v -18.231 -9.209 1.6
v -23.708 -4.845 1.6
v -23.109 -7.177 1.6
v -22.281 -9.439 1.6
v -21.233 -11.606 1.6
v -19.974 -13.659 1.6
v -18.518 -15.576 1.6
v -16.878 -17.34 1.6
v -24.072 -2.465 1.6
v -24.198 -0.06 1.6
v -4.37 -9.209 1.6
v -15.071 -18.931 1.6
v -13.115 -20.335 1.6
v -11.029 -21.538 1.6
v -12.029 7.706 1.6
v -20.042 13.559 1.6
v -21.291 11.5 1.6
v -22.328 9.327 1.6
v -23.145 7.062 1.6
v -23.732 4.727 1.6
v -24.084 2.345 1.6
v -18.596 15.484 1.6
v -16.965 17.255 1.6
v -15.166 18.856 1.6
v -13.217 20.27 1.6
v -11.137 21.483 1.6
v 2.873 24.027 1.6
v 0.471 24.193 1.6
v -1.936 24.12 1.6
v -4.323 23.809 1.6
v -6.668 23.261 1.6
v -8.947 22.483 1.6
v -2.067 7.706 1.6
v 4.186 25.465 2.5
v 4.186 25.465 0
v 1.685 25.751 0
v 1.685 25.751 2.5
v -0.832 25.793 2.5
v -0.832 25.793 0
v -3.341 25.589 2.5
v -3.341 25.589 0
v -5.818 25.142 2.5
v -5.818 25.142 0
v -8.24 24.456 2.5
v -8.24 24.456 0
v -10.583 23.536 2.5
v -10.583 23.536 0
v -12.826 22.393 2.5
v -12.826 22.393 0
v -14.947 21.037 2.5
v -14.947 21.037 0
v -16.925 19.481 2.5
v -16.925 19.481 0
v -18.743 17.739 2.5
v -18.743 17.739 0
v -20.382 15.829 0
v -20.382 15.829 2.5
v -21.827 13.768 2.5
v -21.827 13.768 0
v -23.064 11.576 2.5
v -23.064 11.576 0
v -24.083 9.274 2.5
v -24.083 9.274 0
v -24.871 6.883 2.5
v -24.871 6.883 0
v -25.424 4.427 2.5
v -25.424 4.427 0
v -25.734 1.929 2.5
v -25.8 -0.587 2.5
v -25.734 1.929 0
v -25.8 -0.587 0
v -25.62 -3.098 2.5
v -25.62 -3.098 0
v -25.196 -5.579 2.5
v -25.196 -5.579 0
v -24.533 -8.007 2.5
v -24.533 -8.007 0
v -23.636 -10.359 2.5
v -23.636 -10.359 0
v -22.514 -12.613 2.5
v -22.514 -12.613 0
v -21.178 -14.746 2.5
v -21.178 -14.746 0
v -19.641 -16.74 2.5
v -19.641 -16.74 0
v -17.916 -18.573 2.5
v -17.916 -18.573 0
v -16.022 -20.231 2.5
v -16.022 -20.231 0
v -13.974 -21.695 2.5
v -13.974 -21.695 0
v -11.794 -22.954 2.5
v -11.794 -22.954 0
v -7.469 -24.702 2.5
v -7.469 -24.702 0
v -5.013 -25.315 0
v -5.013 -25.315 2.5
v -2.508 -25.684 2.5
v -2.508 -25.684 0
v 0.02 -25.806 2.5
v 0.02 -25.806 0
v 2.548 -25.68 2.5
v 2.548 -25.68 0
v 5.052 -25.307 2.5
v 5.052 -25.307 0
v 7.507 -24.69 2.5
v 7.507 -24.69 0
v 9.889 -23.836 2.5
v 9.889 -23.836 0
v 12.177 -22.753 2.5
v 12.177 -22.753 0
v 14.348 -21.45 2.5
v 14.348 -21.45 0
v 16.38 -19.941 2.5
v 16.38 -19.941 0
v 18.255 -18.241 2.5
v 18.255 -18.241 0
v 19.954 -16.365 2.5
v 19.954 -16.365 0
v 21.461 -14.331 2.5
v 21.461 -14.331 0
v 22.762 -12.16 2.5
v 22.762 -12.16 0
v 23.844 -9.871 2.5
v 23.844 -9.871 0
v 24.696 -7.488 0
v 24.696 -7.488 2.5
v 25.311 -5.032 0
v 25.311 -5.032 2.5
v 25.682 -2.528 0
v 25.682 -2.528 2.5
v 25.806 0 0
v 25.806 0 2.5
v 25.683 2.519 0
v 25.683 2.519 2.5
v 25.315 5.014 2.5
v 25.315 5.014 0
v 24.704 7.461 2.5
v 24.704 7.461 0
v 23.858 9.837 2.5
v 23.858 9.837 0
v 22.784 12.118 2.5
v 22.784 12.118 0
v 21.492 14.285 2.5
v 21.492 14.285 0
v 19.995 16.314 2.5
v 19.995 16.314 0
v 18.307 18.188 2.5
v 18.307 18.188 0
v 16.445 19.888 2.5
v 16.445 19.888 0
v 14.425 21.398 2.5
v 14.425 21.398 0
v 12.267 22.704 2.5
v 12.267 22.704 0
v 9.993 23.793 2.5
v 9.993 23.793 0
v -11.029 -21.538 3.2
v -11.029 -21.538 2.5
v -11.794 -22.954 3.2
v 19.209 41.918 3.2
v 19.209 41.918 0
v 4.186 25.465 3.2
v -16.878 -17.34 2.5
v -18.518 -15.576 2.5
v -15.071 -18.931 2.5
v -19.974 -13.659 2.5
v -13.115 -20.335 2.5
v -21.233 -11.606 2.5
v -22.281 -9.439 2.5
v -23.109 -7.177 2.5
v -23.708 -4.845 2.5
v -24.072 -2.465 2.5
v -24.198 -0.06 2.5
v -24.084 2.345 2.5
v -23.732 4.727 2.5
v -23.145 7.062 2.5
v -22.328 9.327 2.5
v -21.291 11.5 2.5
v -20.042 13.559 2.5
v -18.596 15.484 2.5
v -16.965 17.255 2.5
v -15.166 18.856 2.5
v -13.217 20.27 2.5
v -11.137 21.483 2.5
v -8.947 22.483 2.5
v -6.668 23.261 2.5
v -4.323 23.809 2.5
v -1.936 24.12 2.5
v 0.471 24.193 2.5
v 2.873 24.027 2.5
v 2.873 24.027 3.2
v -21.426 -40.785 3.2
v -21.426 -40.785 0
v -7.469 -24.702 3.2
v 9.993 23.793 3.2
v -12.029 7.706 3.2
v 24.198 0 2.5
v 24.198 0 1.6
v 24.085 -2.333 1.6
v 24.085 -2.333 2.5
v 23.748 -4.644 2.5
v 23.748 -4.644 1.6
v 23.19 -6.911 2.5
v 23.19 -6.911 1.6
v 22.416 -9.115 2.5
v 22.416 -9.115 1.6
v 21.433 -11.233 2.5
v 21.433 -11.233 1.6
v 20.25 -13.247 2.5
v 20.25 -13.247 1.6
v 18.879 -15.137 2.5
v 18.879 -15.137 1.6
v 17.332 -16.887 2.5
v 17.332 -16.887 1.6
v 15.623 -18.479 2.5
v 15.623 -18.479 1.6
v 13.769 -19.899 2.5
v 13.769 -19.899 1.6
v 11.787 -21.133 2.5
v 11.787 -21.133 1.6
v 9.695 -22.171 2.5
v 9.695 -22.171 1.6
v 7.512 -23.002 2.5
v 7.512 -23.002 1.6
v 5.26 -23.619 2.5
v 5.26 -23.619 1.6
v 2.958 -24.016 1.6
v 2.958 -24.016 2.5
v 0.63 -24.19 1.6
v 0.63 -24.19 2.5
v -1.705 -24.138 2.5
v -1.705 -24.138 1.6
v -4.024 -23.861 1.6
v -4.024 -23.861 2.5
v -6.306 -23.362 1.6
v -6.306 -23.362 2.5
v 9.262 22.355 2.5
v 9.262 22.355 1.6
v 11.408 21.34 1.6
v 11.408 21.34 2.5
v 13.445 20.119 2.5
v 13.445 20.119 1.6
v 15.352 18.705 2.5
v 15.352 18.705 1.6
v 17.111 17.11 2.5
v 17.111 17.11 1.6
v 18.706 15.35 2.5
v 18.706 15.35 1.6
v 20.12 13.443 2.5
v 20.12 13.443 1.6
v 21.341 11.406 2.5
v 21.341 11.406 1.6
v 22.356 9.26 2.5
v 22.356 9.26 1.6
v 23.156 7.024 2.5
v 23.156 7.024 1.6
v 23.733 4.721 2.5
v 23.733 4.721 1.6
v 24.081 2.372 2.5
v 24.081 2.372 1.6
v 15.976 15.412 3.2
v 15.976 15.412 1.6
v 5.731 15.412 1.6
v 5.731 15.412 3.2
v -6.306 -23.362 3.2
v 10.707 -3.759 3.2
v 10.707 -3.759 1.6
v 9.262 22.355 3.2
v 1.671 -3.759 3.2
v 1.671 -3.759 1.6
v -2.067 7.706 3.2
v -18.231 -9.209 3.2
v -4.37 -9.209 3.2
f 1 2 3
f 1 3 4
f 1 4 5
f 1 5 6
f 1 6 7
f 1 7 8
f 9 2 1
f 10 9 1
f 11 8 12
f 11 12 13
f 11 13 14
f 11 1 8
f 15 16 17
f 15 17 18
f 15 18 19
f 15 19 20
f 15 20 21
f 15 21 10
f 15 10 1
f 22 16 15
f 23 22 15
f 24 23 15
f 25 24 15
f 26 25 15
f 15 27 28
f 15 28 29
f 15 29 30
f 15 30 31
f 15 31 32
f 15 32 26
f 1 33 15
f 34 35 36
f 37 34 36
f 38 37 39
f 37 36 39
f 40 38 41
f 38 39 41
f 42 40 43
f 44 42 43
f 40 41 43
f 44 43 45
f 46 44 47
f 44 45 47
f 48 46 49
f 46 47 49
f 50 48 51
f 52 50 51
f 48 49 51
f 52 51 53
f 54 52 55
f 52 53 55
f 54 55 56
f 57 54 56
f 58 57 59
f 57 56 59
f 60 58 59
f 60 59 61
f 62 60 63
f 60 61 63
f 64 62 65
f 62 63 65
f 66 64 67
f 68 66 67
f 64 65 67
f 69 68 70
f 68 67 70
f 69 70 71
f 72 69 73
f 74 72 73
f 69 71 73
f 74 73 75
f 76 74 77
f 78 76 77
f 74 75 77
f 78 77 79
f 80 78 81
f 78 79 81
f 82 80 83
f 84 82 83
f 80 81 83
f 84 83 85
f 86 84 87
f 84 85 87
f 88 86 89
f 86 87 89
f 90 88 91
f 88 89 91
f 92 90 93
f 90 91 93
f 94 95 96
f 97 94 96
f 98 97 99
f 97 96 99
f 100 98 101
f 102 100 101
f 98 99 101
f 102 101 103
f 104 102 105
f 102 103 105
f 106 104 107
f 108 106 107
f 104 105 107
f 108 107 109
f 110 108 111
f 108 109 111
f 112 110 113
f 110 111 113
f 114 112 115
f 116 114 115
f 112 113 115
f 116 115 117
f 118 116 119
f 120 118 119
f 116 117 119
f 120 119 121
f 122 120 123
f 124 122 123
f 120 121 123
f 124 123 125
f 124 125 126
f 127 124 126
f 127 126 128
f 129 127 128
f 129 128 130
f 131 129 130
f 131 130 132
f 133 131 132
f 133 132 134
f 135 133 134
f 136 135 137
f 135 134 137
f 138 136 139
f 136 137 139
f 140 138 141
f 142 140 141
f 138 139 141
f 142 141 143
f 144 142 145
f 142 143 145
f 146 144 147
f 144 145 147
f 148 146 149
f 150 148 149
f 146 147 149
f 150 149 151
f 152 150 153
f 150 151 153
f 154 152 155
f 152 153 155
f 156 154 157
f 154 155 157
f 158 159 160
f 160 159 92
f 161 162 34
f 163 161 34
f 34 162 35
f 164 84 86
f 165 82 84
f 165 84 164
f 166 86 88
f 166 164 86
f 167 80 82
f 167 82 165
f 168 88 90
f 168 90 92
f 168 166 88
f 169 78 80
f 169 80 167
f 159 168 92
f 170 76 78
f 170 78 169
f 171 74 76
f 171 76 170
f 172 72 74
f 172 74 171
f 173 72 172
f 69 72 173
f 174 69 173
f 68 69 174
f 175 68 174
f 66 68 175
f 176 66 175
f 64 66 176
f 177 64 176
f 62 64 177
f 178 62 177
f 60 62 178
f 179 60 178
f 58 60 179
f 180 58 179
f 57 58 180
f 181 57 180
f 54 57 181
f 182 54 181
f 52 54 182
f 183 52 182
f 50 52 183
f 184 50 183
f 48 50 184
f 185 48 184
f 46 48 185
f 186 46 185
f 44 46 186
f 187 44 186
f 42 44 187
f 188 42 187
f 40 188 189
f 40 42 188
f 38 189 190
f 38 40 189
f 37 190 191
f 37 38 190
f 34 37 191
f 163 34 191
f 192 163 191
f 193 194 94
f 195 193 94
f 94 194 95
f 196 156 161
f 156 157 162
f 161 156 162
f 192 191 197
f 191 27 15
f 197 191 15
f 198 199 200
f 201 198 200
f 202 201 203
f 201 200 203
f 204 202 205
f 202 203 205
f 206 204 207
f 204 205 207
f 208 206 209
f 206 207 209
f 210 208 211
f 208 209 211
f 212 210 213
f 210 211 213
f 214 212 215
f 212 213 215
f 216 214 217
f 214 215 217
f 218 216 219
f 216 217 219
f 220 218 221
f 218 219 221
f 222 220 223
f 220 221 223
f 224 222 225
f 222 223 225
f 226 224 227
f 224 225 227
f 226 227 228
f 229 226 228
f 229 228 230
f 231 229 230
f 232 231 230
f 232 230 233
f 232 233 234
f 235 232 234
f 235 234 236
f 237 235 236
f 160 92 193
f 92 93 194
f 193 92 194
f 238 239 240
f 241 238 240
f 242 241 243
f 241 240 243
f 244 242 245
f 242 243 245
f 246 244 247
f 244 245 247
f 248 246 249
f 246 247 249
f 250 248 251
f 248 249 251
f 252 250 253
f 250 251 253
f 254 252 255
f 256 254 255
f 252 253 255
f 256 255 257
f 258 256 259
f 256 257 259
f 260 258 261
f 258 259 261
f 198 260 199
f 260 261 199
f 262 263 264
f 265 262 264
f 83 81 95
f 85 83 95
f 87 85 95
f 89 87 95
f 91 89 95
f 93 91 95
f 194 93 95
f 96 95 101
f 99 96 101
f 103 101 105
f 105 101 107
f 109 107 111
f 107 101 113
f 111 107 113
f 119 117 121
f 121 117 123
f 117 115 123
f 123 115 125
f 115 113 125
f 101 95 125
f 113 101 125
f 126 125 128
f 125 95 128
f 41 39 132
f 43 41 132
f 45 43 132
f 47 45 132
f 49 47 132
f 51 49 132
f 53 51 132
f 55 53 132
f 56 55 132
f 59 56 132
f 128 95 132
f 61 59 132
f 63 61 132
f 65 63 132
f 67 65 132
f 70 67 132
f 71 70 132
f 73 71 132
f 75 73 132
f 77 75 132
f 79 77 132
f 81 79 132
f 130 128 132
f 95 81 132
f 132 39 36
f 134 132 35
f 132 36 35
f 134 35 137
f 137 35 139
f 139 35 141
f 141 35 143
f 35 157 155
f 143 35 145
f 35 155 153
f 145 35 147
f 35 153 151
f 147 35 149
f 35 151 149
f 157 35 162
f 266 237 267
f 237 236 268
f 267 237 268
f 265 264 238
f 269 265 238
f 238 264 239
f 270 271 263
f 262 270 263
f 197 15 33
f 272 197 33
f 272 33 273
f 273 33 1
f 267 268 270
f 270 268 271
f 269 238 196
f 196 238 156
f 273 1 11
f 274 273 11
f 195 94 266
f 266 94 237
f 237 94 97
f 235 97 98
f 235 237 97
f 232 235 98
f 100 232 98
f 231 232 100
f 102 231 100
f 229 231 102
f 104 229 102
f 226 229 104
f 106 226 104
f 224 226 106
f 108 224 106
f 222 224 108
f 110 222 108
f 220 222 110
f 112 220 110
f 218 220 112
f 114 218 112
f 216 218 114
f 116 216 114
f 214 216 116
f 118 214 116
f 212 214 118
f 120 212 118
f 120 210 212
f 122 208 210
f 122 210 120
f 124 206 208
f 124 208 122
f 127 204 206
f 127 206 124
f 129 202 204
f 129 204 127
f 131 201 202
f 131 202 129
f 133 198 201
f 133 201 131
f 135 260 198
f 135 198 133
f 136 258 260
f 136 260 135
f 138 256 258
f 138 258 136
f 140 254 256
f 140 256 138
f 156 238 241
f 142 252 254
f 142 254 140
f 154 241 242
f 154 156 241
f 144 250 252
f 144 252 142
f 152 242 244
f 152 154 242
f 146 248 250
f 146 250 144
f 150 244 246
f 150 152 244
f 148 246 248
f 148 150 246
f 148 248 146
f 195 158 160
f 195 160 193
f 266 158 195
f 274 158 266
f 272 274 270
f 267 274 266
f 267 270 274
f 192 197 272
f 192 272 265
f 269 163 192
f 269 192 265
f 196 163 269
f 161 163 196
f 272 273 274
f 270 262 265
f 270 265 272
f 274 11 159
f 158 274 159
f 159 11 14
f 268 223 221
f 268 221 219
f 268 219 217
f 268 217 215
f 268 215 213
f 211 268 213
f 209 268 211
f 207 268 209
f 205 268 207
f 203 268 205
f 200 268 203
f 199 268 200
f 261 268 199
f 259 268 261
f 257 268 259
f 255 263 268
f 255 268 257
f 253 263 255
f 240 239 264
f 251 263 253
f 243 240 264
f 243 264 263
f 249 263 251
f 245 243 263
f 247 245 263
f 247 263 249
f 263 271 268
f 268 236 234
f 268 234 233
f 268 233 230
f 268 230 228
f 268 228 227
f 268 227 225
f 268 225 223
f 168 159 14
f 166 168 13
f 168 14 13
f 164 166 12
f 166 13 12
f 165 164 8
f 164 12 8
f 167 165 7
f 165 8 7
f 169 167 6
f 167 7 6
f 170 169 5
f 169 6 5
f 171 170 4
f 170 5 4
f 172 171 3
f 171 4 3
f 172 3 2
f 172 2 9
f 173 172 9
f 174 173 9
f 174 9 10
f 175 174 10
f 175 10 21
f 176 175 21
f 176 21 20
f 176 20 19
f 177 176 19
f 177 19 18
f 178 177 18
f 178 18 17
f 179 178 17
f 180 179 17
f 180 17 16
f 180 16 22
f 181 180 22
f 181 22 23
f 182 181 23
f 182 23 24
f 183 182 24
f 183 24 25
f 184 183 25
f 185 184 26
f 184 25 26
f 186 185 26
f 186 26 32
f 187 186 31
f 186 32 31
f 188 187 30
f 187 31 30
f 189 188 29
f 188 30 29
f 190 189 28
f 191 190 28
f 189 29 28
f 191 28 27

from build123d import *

# Parameters (mm, degrees)
F1_DEPTH = 3.2
F2_DEPTH = 1.6
F3_DEPTH = 2.5


with BuildPart() as f1:
    # F0 (on Top) → F1 (new body)
    with BuildSketch(Plane.XY):
        with BuildLine():
            Line((5.7308066454, 15.4116954654), (9.2615315623, 22.3554545173))
            ThreePointArc((9.2615315623, 22.3554545173), (6.124599836, 23.4100745493), (2.8731075212, 24.026809333))
            Line((2.8731075212, 24.026809333), (-12.0286401361, 7.7058477327))
            Line((-12.0286401361, 7.7058477327), (-2.0674222615, 7.7058477327))
            Line((-2.0674222615, 7.7058477327), (-18.230907619, -9.2094279826))
            Line((-18.230907619, -9.2094279826), (-4.3697794008, -9.2094279826))
            Line((-4.3697794008, -9.2094279826), (-11.0294978873, -21.5381635686))
            ThreePointArc((-11.0294978873, -21.5381635686), (-8.7153894779, -22.573973948), (-6.3056047528, -23.3619704275))
            Line((-6.3056047528, -23.3619704275), (10.7070716166, -3.7589499261))
            Line((10.7070716166, -3.7589499261), (1.6710584512, -3.7589499261))
            Line((1.6710584512, -3.7589499261), (15.9755367786, 15.4116954654))
            Line((15.9755367786, 15.4116954654), (5.7308066454, 15.4116954654))
        make_face()
        with BuildLine():
            Line((-7.468564605, -24.7020021385), (-6.3056047528, -23.3619704275))
            ThreePointArc((-6.3056047528, -23.3619704275), (-8.7153894779, -22.573973948), (-11.0294978873, -21.5381635686))
            Line((-11.0294978873, -21.5381635686), (-11.7940875977, -22.9536024329))
            ThreePointArc((-11.7940875977, -22.9536024329), (-9.6709186664, -23.9257538869), (-7.468564605, -24.7020021385))
        make_face()
        with BuildLine():
            ThreePointArc((2.8731075212, 24.026809333), (6.124599836, 23.4100745493), (9.2615315623, 22.3554545173))
            Line((9.2615315623, 22.3554545173), (9.9925901152, 23.7932030147))
            ThreePointArc((9.9925901152, 23.7932030147), (7.1383273937, 24.799448561), (4.1858882241, 25.464616759))
            Line((4.1858882241, 25.464616759), (2.8731075212, 24.026809333))
        make_face()
        with BuildLine():
            ThreePointArc((4.1858882241, 25.464616759), (7.1383273937, 24.799448561), (9.9925901152, 23.7932030147))
            Line((9.9925901152, 23.7932030147), (19.2086462315, 41.9181135037))
            Line((19.2086462315, 41.9181135037), (4.1858882241, 25.464616759))
        make_face()
        with BuildLine():
            Line((-21.4260146022, -40.7846085727), (-7.468564605, -24.7020021385))
            ThreePointArc((-7.468564605, -24.7020021385), (-9.6709186664, -23.9257538869), (-11.7940875977, -22.9536024329))
            Line((-11.7940875977, -22.9536024329), (-21.4260146022, -40.7846085727))
        make_face()
    extrude(amount=F1_DEPTH)

    # F0 (on Top) → F2 (join)
    with BuildSketch(Plane.XY):
        with BuildLine():
            ThreePointArc((-6.3056047528, -23.3619704275), (14.7132492292, -19.2110023339), (24.1979816008, 0))
            ThreePointArc((24.1979816008, 0), (20.1202967659, 13.4430640706), (9.2615315623, 22.3554545173))
            Line((9.2615315623, 22.3554545173), (5.7308066454, 15.4116954654))
            Line((5.7308066454, 15.4116954654), (15.9755367786, 15.4116954654))
            Line((15.9755367786, 15.4116954654), (1.6710584512, -3.7589499261))
            Line((1.6710584512, -3.7589499261), (10.7070716166, -3.7589499261))
            Line((10.7070716166, -3.7589499261), (-6.3056047528, -23.3619704275))
        make_face()
        with BuildLine():
            Line((-12.0286401361, 7.7058477327), (2.8731075212, 24.026809333))
            ThreePointArc((2.8731075212, 24.026809333), (-23.1446184854, 7.061795007), (-11.0294978873, -21.5381635686))
            Line((-11.0294978873, -21.5381635686), (-4.3697794008, -9.2094279826))
            Line((-4.3697794008, -9.2094279826), (-18.230907619, -9.2094279826))
            Line((-18.230907619, -9.2094279826), (-2.0674222615, 7.7058477327))
            Line((-2.0674222615, 7.7058477327), (-12.0286401361, 7.7058477327))
        make_face()
    extrude(amount=F2_DEPTH)

    # F0 (on Top) → F3 (join)
    with BuildSketch(Plane.XY):
        with BuildLine():
            ThreePointArc((-11.0294978873, -21.5381635686), (-23.1446184854, 7.061795007), (2.8731075212, 24.026809333))
            Line((2.8731075212, 24.026809333), (4.1858882241, 25.464616759))
            ThreePointArc((4.1858882241, 25.464616759), (-24.5061657926, 8.0880285022), (-11.7940875977, -22.9536024329))
            Line((-11.7940875977, -22.9536024329), (-11.0294978873, -21.5381635686))
        make_face()
        with BuildLine():
            ThreePointArc((9.2615315623, 22.3554545173), (20.1202967659, 13.4430640706), (24.1979816008, 0))
            ThreePointArc((24.1979816008, 0), (14.7132492292, -19.2110023339), (-6.3056047528, -23.3619704275))
            Line((-6.3056047528, -23.3619704275), (-7.468564605, -24.7020021385))
            ThreePointArc((-7.468564605, -24.7020021385), (15.3823255436, -20.7208211174), (25.8063629151, 0))
            ThreePointArc((25.8063629151, 0), (21.4923332131, 14.2845363931), (9.9925901152, 23.7932030147))
            Line((9.9925901152, 23.7932030147), (9.2615315623, 22.3554545173))
        make_face()
    extrude(amount=F3_DEPTH)


solid = f1.part
